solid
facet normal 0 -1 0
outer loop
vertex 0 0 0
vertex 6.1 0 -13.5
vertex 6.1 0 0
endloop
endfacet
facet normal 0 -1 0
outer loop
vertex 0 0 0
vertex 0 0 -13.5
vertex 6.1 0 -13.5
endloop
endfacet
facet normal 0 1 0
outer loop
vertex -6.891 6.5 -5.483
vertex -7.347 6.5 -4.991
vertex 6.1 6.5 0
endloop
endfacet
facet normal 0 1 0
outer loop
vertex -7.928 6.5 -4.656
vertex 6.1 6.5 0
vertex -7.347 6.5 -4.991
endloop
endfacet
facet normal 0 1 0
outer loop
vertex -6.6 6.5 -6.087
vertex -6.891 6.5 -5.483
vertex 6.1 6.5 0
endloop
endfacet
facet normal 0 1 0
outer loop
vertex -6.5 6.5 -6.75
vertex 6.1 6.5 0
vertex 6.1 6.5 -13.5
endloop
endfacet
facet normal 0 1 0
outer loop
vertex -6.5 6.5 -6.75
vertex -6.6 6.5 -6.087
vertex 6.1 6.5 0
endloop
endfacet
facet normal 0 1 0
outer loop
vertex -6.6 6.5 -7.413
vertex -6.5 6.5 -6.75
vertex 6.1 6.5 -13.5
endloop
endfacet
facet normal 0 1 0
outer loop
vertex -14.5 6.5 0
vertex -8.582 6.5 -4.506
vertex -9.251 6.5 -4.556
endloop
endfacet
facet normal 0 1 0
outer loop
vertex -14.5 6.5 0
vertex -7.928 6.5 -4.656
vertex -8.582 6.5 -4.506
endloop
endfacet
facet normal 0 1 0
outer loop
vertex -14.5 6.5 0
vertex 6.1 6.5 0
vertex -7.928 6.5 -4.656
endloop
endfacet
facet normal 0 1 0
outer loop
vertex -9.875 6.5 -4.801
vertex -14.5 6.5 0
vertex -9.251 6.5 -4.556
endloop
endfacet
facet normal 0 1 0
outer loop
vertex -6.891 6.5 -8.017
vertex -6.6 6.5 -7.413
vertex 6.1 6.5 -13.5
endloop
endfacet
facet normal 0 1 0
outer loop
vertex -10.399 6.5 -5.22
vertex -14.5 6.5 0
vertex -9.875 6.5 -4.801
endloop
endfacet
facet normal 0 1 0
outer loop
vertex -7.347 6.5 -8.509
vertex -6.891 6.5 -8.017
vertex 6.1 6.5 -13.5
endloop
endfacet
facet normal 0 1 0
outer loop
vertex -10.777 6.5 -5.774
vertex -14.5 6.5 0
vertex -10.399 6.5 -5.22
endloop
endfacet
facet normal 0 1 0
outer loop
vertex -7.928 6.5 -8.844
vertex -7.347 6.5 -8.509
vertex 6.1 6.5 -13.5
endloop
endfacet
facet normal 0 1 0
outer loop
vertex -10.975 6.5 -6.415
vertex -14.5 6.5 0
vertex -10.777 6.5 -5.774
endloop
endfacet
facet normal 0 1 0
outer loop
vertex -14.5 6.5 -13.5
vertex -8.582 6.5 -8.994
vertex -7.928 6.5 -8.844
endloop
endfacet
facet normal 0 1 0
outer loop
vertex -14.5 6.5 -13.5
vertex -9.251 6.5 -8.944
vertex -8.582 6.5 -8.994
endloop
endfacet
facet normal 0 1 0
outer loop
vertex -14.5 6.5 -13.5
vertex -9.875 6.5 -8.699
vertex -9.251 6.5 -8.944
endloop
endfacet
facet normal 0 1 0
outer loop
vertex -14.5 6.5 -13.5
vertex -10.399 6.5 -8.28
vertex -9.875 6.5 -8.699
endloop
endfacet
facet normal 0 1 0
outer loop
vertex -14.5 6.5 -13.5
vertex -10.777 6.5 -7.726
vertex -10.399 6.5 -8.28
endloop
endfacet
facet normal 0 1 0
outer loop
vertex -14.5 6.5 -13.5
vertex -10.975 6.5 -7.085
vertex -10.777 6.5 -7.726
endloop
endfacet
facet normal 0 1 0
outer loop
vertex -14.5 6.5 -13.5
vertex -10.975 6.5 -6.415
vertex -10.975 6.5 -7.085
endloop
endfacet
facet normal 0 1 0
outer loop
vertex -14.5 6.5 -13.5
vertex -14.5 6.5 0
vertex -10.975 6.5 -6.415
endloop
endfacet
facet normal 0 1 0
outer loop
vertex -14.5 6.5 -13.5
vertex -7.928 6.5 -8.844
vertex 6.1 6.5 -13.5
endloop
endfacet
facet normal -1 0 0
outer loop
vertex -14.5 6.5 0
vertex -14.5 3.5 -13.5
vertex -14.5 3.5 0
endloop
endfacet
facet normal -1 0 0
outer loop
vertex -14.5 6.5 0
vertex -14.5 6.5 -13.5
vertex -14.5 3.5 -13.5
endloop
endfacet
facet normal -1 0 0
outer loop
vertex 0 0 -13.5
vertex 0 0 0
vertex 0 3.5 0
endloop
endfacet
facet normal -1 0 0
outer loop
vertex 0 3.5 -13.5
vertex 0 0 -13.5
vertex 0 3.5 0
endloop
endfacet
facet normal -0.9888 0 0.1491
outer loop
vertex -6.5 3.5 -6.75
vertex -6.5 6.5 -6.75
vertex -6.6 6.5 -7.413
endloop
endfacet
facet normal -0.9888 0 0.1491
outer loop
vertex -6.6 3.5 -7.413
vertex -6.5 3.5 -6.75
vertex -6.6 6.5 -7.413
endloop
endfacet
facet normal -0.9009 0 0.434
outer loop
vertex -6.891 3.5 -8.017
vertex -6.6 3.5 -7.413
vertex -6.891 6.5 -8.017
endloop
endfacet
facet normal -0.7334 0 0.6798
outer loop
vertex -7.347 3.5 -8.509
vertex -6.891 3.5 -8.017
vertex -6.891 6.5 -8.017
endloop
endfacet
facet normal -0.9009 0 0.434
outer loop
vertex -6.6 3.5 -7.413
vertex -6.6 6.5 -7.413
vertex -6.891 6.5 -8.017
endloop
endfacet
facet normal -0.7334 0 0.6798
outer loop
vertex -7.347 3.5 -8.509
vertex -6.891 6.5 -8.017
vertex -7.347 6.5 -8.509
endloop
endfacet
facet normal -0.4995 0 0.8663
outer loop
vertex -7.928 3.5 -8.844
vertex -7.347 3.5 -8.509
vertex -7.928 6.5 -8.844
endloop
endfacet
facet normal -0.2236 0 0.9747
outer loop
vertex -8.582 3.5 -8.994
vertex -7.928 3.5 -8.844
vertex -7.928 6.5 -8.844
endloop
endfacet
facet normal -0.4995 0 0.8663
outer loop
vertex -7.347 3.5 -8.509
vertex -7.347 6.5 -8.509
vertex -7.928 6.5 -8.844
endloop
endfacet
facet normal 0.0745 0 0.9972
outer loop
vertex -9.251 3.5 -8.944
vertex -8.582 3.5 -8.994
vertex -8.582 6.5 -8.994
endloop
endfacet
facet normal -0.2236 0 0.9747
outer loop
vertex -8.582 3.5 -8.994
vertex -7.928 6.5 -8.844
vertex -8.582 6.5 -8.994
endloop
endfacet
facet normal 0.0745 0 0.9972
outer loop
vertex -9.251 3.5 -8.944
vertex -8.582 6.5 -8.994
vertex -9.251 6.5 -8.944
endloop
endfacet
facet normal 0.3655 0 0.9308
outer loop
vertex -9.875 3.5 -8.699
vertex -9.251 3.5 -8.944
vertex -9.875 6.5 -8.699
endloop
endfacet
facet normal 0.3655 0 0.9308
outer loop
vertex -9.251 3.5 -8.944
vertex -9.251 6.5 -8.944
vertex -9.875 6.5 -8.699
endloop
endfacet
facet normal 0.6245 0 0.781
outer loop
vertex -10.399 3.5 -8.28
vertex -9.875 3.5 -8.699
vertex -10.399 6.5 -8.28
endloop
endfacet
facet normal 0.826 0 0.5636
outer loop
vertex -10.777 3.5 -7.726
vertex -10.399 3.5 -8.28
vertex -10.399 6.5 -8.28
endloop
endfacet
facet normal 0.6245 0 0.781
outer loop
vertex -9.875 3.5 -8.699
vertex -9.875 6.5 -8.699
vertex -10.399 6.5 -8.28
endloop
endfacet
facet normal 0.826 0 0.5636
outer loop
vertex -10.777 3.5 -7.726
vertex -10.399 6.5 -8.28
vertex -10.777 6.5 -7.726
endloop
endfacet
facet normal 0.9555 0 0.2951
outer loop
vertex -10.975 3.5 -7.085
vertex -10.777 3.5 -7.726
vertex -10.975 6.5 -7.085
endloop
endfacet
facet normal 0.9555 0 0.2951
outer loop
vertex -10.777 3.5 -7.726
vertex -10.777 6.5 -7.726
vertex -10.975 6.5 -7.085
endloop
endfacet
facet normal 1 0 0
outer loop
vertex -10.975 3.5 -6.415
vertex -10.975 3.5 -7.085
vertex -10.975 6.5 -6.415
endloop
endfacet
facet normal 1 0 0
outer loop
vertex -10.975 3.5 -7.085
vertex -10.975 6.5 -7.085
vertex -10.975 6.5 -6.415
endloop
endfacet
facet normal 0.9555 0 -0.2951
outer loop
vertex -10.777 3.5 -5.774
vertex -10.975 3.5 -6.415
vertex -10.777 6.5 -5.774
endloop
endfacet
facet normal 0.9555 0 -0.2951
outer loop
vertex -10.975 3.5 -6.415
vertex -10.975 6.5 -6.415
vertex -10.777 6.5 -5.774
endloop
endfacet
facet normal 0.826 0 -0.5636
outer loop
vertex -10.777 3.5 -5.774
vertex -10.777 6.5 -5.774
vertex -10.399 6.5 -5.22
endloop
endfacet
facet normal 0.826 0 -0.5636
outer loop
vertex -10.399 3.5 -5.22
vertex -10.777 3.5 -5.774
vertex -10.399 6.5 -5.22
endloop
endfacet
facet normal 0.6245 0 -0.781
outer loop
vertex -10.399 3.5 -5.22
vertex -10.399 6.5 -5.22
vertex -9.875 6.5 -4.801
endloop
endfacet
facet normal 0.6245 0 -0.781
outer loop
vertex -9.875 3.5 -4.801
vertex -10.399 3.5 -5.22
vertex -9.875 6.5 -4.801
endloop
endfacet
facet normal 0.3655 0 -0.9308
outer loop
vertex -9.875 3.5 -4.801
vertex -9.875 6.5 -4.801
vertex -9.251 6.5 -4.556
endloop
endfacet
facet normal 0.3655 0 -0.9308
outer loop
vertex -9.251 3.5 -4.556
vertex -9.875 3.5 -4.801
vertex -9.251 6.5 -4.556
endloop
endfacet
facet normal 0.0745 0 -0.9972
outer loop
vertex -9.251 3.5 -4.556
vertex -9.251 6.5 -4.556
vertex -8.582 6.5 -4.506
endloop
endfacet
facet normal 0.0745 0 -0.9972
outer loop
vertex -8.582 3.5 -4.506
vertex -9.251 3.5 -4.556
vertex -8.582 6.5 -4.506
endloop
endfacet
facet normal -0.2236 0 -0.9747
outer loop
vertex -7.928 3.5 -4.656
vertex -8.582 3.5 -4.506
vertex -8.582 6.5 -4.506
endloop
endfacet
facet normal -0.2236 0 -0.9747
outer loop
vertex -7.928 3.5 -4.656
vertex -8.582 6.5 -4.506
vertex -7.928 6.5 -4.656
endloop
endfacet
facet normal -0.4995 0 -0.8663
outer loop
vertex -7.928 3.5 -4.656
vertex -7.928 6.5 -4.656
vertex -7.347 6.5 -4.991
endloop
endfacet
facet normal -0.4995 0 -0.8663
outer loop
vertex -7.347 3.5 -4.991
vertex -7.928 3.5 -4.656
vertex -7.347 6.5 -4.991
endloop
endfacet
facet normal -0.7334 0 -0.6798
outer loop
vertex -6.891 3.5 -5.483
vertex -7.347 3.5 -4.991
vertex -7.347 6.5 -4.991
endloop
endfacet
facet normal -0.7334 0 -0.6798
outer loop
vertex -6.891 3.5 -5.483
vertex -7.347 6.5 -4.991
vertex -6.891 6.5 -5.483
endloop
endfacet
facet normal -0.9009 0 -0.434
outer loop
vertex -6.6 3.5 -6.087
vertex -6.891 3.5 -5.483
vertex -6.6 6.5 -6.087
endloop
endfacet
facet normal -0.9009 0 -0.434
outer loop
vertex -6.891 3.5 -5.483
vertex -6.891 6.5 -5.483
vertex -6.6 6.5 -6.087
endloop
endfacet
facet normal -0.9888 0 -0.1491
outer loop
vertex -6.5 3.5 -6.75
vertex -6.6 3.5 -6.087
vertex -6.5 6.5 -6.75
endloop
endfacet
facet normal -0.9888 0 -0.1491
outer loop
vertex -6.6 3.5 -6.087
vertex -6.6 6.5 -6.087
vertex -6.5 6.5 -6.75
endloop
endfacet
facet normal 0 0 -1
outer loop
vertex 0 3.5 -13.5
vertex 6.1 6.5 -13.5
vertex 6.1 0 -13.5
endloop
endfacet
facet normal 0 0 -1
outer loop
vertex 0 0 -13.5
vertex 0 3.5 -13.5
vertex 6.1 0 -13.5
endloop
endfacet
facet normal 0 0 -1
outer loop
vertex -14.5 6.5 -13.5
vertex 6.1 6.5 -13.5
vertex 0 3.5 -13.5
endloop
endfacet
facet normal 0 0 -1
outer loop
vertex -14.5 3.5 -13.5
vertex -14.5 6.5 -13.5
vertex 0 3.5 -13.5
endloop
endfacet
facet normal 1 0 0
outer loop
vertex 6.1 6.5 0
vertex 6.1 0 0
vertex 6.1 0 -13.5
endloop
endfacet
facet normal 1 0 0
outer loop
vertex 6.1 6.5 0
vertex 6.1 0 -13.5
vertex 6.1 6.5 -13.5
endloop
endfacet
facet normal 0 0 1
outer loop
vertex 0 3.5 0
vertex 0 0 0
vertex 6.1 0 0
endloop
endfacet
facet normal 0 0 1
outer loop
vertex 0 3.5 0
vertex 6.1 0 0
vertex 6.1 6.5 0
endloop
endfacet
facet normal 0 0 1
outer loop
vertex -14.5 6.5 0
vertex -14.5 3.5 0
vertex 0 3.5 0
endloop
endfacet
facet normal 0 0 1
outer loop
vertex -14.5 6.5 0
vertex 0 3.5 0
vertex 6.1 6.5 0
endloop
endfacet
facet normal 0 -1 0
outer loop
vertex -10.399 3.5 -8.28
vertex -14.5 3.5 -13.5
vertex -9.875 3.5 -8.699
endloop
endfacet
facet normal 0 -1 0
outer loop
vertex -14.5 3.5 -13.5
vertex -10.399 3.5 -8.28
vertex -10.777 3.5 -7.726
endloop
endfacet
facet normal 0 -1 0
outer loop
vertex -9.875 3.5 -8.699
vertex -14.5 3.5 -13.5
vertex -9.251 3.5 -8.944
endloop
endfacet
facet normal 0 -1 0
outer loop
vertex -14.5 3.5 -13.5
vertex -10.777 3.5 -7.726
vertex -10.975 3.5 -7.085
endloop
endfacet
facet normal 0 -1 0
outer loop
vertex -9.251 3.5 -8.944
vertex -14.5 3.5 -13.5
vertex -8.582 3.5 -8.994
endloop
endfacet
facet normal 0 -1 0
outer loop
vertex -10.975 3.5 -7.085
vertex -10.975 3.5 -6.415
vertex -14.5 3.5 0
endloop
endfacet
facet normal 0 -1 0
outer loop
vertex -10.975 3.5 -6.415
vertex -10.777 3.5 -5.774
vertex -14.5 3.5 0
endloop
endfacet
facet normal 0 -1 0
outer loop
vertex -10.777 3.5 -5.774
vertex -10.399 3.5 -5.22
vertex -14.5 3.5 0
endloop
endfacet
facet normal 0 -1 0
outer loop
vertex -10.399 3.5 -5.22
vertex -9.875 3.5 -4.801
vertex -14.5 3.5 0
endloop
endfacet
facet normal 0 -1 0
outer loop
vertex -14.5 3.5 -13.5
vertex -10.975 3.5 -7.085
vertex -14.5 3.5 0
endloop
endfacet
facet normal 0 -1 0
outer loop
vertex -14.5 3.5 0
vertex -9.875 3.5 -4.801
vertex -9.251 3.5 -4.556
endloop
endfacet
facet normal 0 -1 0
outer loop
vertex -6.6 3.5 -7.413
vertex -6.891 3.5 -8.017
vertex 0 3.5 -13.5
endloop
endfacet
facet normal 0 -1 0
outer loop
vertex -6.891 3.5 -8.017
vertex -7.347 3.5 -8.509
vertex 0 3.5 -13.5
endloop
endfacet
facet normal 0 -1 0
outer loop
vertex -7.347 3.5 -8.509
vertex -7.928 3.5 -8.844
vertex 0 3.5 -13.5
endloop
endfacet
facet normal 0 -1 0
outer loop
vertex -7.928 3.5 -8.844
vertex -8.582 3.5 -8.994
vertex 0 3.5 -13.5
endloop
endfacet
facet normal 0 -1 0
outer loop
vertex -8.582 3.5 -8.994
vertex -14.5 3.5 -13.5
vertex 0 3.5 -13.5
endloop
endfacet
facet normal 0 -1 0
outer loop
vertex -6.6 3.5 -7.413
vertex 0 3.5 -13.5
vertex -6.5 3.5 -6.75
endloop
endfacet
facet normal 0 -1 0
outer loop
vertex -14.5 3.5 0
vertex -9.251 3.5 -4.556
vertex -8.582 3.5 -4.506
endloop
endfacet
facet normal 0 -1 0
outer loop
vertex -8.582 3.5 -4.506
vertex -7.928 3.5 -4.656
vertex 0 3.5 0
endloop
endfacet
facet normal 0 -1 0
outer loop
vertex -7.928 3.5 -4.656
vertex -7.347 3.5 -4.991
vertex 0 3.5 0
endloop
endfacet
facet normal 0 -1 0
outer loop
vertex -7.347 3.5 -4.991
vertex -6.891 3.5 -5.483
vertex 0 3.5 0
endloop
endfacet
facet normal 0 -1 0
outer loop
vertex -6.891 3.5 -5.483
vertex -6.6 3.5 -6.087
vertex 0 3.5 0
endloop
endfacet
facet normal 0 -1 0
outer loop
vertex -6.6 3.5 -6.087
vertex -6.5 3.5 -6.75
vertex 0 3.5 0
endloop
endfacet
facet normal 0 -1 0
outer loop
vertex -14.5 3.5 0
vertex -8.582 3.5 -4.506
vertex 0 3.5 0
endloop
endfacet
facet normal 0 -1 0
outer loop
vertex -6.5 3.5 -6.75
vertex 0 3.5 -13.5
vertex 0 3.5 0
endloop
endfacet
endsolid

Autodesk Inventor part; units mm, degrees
ref_plane "YZ Plane" through (0, 0, 0) normal (1, 0, 0) x (0, 1, 0)
ref_plane "XZ Plane" through (0, 0, 0) normal (0, 1, 0) x (-1, 0, 0)
ref_plane "XY Plane" through (0, 0, 0) normal (0, 0, 1) x (1, 0, 0)
sketch "Sketch1" plane through (0, 0, 0) normal (1, 0, 0) x (0, 1, 0)
  line L0 (0, 0) -> (6.5, 0)
  line L1 (6.5, 0) -> (6.5, -13.5)
  line L2 (6.5, -13.5) -> (0, -13.5)
  line L3 (0, -13.5) -> (0, 0)
  dimension "d0" = 6.5
  dimension "d1" = 13.5
extrude "Extrusion1" add sketch "Sketch1" along normal blind 6.1
sketch "Sketch2" plane through (0, 0, 0) normal (-1, 0, 0) x (0, 0, 1)
  line L0 (-13.5, 3.5) -> (0, 3.5)
  line L1 (0, 3.5) -> (0, 6.5)
  line L2 (0, 6.5) -> (-13.5, 6.5)
  line L3 (-13.5, 6.5) -> (-13.5, 3.5)
  line L4 (0, 6.5) -> (0, 0) projected
  line L5 (-13.5, 6.5) -> (0, 6.5) projected
  dimension "d4" = 3
  dimension "d5" = 13.5
  dimension "d6" = 0
  dimension "d7" = 0
extrude "Extrusion2" add sketch "Sketch2" along normal blind 14.5
sketch "Sketch3" plane through (6.1, 6.5, 0) normal (0, 1, 0) x (1, 0, 0)
  circle A0 centre (-14.85, 6.75) radius 2.25
  line L0 (-20.6, 0) -> (-20.6, 13.5) projected
  line L1 (-20.6, 0) -> (0, 0) projected
  point P0 (-6.1, 0)
  dimension "d10" = 4.5
  dimension "d11" = 5.75
  dimension "d12" = 6.75
extrude "Extrusion3" cut sketch "Sketch3" against normal blind 14.5
sketch "Sketch4" plane through (6.1, 0, -13.5) normal (0, 0, -1) x (-1, 0, 0)
  point P0 (6.1, 0)
properties part number "gear support attachment"
